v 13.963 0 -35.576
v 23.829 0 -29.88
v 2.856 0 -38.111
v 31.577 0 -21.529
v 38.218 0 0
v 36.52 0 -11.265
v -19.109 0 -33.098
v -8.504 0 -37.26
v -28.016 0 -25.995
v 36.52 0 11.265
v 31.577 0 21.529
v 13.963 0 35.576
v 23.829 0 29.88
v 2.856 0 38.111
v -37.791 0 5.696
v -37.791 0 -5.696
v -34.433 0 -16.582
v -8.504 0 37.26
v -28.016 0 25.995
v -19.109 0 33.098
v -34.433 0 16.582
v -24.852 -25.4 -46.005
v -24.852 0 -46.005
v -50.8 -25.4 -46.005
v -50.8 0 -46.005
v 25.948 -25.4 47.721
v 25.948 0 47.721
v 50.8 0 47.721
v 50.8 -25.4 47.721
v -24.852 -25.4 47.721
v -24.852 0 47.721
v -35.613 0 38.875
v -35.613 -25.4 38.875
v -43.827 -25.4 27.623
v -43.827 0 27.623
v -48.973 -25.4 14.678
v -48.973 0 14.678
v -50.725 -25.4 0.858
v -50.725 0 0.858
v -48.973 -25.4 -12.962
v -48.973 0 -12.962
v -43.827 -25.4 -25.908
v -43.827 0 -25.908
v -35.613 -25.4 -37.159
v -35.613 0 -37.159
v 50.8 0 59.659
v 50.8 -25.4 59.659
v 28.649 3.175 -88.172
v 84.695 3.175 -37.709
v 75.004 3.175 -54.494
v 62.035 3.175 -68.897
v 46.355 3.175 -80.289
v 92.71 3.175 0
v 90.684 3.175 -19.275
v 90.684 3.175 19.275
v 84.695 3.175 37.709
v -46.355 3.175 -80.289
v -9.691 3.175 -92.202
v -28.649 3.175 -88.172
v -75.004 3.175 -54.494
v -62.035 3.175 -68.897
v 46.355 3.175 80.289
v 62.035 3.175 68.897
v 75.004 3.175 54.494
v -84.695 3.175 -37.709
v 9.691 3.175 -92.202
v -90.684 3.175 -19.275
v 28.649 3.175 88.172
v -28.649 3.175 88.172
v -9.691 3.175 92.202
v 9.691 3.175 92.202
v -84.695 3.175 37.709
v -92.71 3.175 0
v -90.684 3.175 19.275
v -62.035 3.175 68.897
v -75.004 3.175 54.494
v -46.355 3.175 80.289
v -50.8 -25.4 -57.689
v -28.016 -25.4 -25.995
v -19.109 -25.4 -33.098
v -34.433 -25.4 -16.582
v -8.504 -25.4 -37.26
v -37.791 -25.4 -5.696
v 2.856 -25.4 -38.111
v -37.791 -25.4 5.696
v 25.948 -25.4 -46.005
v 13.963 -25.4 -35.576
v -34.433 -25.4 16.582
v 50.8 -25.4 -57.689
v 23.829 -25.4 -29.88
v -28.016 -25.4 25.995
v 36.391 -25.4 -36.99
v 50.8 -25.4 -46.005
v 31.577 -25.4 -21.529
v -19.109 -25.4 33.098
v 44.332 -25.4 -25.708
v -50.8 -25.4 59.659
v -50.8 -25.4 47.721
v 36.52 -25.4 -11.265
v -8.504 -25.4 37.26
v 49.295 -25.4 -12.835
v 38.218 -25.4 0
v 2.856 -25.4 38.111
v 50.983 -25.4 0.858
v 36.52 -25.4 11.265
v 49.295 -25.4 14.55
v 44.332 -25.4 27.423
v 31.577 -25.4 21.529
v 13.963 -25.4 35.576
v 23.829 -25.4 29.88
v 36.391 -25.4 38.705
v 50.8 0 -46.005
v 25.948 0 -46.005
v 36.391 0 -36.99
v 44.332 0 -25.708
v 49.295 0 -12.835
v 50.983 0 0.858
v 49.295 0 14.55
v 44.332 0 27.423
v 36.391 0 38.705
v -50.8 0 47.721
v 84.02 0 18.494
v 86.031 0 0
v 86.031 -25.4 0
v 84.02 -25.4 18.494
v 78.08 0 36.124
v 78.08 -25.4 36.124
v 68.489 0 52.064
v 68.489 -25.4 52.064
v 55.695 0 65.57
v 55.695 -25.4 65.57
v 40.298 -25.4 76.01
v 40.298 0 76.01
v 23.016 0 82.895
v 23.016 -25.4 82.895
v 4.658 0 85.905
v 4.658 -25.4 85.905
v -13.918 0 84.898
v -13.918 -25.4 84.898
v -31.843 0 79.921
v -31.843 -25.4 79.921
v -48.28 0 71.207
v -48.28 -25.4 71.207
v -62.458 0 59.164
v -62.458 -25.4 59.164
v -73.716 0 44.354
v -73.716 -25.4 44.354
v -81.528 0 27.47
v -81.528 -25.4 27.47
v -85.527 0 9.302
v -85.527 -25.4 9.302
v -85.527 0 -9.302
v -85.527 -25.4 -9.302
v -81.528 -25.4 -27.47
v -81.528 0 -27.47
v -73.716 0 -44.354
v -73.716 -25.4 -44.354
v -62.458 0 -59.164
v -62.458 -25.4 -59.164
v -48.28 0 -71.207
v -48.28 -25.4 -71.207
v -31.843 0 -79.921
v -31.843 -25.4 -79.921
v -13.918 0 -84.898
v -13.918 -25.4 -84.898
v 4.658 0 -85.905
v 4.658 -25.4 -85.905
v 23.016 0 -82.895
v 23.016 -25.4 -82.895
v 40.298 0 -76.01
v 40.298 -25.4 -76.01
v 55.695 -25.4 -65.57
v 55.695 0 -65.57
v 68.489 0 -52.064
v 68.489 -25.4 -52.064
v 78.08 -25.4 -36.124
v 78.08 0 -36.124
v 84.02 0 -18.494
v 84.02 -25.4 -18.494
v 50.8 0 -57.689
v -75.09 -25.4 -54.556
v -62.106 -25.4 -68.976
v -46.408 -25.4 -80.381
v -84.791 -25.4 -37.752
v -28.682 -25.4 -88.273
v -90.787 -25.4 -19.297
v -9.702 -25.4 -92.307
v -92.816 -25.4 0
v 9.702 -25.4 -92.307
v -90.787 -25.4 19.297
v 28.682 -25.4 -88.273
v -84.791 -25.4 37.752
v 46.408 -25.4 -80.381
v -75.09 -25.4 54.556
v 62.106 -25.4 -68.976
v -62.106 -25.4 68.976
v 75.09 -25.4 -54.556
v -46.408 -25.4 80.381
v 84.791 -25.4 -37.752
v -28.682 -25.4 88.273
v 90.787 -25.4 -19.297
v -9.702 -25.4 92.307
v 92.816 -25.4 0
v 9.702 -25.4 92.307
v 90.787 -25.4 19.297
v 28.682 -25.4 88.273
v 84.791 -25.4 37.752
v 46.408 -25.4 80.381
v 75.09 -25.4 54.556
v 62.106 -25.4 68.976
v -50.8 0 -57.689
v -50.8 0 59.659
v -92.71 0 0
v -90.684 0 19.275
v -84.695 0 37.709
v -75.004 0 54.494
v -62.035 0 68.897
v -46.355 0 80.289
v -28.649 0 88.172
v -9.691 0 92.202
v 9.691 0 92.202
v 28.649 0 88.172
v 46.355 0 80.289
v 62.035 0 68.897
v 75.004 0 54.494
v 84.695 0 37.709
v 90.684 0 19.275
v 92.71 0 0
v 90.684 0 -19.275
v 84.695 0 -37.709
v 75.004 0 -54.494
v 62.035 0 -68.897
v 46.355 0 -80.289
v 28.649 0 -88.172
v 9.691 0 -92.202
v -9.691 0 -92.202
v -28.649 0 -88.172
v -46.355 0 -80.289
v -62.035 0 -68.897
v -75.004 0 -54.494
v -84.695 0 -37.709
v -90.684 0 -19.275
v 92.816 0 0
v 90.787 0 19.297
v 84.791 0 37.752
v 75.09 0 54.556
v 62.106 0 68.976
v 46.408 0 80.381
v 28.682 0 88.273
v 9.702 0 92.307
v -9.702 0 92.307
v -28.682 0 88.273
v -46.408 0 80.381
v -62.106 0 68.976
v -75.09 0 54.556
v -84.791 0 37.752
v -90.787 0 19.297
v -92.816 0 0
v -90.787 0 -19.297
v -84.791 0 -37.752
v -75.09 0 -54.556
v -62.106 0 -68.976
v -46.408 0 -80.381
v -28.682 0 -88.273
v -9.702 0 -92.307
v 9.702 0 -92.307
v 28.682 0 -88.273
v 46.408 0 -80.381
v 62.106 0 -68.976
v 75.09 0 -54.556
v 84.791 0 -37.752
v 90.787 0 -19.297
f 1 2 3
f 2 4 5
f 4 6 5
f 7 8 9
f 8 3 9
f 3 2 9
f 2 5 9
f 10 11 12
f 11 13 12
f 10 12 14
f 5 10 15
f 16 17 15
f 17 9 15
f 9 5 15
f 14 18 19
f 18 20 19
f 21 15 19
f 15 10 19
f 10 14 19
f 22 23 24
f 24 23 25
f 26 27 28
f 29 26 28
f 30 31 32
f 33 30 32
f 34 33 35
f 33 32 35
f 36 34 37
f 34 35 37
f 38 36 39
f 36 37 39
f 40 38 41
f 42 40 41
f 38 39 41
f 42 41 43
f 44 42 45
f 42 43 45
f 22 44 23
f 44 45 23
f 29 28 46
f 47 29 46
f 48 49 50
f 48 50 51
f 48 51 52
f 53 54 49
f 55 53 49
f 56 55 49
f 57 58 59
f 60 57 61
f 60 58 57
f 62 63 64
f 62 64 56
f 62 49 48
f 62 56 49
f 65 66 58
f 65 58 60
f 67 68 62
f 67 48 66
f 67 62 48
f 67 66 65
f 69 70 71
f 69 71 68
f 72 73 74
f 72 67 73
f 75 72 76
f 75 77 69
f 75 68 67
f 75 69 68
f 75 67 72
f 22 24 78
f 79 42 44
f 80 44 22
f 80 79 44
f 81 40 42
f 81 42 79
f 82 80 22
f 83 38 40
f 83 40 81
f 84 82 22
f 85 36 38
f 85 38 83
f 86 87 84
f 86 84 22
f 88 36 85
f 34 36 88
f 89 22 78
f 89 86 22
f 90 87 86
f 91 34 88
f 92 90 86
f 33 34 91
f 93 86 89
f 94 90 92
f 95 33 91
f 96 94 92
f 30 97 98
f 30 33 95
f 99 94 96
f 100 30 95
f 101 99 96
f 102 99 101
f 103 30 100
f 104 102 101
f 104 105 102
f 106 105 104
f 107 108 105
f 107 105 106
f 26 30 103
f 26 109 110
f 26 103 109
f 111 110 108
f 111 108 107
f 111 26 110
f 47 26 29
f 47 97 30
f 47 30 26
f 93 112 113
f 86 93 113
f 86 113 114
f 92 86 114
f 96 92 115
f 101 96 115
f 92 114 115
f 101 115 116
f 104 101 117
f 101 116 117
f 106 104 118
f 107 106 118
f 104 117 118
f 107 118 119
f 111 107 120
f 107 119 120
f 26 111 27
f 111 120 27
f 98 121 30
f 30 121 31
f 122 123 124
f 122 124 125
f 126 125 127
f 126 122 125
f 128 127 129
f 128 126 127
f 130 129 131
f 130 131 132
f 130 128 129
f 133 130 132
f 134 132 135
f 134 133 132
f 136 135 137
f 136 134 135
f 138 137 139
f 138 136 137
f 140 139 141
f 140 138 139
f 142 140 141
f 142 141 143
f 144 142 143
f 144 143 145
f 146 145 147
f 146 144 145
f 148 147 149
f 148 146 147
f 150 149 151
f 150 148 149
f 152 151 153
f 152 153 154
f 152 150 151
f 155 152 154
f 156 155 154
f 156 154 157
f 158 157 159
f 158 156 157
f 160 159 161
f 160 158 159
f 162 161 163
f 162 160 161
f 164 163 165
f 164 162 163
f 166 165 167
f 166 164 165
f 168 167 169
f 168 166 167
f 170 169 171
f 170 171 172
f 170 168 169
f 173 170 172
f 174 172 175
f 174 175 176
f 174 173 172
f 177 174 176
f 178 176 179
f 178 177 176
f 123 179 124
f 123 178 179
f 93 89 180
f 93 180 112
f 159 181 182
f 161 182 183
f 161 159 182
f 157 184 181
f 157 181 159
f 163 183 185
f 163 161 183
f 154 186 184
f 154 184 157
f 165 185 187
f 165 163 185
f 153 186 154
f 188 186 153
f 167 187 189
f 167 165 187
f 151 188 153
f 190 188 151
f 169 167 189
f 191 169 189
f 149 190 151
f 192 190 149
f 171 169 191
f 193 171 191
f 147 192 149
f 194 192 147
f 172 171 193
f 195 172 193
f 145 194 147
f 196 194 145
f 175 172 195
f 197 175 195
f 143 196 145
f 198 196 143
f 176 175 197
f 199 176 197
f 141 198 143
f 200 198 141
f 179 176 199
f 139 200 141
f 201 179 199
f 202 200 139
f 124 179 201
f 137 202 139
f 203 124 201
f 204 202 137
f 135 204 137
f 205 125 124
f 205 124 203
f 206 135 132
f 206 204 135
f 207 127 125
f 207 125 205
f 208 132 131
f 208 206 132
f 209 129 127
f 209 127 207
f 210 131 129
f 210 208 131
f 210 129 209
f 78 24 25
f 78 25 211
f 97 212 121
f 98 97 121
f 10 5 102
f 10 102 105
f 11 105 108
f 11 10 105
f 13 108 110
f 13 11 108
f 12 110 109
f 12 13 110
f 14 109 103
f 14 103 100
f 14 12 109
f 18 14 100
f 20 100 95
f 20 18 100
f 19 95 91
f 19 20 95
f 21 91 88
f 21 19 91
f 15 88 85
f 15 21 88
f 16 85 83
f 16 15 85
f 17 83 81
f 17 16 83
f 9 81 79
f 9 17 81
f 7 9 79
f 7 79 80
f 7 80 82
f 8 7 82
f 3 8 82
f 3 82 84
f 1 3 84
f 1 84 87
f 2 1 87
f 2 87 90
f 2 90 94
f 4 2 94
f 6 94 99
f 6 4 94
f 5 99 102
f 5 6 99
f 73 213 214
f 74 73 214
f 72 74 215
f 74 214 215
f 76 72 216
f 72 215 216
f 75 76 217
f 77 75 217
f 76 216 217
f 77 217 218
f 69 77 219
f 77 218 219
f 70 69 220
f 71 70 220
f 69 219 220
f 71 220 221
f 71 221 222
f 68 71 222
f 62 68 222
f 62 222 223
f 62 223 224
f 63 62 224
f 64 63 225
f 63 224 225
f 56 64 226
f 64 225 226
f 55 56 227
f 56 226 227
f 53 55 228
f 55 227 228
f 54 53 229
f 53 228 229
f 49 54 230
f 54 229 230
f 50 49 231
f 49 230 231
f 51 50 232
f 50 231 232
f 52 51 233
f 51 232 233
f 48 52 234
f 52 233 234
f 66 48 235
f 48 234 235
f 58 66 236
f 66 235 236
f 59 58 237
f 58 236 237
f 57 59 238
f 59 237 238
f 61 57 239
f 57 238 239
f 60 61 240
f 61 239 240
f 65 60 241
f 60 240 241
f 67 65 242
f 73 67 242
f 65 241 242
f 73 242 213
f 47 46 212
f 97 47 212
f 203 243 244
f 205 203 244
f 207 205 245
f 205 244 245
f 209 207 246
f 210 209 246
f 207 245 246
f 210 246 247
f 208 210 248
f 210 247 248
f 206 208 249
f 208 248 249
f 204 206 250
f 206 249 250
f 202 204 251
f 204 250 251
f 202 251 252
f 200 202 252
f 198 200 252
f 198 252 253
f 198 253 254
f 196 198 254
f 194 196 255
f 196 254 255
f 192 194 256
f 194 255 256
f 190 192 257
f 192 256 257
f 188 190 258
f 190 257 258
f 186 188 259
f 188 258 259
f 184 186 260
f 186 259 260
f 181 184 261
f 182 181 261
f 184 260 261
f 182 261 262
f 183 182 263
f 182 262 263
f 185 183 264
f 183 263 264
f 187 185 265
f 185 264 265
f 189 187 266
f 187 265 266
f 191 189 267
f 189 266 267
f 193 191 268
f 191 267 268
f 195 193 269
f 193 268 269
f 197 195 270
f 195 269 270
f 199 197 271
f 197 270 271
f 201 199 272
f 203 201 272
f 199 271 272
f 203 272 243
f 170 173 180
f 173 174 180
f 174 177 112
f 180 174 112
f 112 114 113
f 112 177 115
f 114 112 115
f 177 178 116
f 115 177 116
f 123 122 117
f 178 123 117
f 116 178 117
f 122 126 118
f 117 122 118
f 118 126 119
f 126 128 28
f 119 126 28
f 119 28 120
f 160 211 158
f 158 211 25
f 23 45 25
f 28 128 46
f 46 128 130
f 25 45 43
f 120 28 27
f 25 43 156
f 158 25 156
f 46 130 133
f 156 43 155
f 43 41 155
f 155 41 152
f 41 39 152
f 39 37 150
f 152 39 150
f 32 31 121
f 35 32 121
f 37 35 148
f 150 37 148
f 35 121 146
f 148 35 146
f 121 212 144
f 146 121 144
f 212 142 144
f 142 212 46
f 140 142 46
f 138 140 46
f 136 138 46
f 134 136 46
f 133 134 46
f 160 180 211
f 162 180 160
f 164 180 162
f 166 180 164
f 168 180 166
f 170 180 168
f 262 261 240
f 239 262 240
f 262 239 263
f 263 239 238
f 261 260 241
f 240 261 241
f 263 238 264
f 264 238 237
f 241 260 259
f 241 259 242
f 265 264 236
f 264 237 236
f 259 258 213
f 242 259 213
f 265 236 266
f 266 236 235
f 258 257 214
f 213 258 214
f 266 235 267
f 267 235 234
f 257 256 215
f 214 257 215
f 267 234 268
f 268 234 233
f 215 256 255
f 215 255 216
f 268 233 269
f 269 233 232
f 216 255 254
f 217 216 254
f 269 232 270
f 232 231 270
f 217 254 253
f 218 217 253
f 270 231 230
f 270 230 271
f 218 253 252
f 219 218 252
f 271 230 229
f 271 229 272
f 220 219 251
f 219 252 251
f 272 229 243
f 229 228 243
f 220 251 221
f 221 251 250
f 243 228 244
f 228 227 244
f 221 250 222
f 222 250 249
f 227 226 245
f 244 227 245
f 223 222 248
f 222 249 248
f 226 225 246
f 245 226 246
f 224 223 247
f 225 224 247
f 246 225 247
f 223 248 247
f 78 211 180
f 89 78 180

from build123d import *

# Parameters (mm, degrees)
F0_R     = 92.815735633
F0_R_2   = 86.0311555183
F1_DEPTH = 25.4
F0_R_3   = 38.21812987
F2_R     = 92.71
F3_DEPTH = 3.175


with BuildPart() as f1:
    # F0 (on Front) → F1 (new body)
    with BuildSketch(Plane.XZ):
        Circle(F0_R)
        Circle(F0_R_2, mode=Mode.SUBTRACT)
    extrude(amount=F1_DEPTH)



with BuildPart() as f1b:
    # F0 (on Front) → F1, piece 2 (new body)
    with BuildSketch(Plane.XZ):
        with BuildLine():
            Line((50.8, 59.6587392047), (-50.8, 59.6587392047))
            Line((-50.8, 59.6587392047), (-50.8, 47.720739051))
            Line((-50.8, 47.720739051), (-24.8520022743, 47.720739051))
            ThreePointArc((-24.8520022743, 47.720739051), (-50.7246708671, 0.8577388972), (-24.8520022743, -46.0052612565))
            Line((-24.8520022743, -46.0052612565), (-50.8, -46.0052612565))
            Line((-50.8, -46.0052612565), (-50.8, -57.6892601803))
            Line((-50.8, -57.6892601803), (50.8, -57.6892601803))
            Line((50.8, -57.6892601803), (50.8, -46.0052612565))
            Line((50.8, -46.0052612565), (25.9479958039, -46.0052612565))
            ThreePointArc((25.9479958039, -46.0052612565), (50.9828195519, 0.8577388972), (25.9479958039, 47.720739051))
            Line((25.9479958039, 47.720739051), (50.8, 47.720739051))
            Line((50.8, 47.720739051), (50.8, 59.6587392047))
        make_face()
        Circle(F0_R_3, mode=Mode.SUBTRACT)
    extrude(amount=F1_DEPTH)


with BuildPart() as f1_1:
    add(f1.part)

    add(f1b.part)  # F3 merges F1b
    # F2 (on face) → F3 (join)
    with BuildSketch(Plane(origin=(0, 0, 0), x_dir=(-1, 0, 0), z_dir=(0, 1, 0))):
        Circle(F2_R)
    extrude(amount=F3_DEPTH)


solid = f1_1.part
